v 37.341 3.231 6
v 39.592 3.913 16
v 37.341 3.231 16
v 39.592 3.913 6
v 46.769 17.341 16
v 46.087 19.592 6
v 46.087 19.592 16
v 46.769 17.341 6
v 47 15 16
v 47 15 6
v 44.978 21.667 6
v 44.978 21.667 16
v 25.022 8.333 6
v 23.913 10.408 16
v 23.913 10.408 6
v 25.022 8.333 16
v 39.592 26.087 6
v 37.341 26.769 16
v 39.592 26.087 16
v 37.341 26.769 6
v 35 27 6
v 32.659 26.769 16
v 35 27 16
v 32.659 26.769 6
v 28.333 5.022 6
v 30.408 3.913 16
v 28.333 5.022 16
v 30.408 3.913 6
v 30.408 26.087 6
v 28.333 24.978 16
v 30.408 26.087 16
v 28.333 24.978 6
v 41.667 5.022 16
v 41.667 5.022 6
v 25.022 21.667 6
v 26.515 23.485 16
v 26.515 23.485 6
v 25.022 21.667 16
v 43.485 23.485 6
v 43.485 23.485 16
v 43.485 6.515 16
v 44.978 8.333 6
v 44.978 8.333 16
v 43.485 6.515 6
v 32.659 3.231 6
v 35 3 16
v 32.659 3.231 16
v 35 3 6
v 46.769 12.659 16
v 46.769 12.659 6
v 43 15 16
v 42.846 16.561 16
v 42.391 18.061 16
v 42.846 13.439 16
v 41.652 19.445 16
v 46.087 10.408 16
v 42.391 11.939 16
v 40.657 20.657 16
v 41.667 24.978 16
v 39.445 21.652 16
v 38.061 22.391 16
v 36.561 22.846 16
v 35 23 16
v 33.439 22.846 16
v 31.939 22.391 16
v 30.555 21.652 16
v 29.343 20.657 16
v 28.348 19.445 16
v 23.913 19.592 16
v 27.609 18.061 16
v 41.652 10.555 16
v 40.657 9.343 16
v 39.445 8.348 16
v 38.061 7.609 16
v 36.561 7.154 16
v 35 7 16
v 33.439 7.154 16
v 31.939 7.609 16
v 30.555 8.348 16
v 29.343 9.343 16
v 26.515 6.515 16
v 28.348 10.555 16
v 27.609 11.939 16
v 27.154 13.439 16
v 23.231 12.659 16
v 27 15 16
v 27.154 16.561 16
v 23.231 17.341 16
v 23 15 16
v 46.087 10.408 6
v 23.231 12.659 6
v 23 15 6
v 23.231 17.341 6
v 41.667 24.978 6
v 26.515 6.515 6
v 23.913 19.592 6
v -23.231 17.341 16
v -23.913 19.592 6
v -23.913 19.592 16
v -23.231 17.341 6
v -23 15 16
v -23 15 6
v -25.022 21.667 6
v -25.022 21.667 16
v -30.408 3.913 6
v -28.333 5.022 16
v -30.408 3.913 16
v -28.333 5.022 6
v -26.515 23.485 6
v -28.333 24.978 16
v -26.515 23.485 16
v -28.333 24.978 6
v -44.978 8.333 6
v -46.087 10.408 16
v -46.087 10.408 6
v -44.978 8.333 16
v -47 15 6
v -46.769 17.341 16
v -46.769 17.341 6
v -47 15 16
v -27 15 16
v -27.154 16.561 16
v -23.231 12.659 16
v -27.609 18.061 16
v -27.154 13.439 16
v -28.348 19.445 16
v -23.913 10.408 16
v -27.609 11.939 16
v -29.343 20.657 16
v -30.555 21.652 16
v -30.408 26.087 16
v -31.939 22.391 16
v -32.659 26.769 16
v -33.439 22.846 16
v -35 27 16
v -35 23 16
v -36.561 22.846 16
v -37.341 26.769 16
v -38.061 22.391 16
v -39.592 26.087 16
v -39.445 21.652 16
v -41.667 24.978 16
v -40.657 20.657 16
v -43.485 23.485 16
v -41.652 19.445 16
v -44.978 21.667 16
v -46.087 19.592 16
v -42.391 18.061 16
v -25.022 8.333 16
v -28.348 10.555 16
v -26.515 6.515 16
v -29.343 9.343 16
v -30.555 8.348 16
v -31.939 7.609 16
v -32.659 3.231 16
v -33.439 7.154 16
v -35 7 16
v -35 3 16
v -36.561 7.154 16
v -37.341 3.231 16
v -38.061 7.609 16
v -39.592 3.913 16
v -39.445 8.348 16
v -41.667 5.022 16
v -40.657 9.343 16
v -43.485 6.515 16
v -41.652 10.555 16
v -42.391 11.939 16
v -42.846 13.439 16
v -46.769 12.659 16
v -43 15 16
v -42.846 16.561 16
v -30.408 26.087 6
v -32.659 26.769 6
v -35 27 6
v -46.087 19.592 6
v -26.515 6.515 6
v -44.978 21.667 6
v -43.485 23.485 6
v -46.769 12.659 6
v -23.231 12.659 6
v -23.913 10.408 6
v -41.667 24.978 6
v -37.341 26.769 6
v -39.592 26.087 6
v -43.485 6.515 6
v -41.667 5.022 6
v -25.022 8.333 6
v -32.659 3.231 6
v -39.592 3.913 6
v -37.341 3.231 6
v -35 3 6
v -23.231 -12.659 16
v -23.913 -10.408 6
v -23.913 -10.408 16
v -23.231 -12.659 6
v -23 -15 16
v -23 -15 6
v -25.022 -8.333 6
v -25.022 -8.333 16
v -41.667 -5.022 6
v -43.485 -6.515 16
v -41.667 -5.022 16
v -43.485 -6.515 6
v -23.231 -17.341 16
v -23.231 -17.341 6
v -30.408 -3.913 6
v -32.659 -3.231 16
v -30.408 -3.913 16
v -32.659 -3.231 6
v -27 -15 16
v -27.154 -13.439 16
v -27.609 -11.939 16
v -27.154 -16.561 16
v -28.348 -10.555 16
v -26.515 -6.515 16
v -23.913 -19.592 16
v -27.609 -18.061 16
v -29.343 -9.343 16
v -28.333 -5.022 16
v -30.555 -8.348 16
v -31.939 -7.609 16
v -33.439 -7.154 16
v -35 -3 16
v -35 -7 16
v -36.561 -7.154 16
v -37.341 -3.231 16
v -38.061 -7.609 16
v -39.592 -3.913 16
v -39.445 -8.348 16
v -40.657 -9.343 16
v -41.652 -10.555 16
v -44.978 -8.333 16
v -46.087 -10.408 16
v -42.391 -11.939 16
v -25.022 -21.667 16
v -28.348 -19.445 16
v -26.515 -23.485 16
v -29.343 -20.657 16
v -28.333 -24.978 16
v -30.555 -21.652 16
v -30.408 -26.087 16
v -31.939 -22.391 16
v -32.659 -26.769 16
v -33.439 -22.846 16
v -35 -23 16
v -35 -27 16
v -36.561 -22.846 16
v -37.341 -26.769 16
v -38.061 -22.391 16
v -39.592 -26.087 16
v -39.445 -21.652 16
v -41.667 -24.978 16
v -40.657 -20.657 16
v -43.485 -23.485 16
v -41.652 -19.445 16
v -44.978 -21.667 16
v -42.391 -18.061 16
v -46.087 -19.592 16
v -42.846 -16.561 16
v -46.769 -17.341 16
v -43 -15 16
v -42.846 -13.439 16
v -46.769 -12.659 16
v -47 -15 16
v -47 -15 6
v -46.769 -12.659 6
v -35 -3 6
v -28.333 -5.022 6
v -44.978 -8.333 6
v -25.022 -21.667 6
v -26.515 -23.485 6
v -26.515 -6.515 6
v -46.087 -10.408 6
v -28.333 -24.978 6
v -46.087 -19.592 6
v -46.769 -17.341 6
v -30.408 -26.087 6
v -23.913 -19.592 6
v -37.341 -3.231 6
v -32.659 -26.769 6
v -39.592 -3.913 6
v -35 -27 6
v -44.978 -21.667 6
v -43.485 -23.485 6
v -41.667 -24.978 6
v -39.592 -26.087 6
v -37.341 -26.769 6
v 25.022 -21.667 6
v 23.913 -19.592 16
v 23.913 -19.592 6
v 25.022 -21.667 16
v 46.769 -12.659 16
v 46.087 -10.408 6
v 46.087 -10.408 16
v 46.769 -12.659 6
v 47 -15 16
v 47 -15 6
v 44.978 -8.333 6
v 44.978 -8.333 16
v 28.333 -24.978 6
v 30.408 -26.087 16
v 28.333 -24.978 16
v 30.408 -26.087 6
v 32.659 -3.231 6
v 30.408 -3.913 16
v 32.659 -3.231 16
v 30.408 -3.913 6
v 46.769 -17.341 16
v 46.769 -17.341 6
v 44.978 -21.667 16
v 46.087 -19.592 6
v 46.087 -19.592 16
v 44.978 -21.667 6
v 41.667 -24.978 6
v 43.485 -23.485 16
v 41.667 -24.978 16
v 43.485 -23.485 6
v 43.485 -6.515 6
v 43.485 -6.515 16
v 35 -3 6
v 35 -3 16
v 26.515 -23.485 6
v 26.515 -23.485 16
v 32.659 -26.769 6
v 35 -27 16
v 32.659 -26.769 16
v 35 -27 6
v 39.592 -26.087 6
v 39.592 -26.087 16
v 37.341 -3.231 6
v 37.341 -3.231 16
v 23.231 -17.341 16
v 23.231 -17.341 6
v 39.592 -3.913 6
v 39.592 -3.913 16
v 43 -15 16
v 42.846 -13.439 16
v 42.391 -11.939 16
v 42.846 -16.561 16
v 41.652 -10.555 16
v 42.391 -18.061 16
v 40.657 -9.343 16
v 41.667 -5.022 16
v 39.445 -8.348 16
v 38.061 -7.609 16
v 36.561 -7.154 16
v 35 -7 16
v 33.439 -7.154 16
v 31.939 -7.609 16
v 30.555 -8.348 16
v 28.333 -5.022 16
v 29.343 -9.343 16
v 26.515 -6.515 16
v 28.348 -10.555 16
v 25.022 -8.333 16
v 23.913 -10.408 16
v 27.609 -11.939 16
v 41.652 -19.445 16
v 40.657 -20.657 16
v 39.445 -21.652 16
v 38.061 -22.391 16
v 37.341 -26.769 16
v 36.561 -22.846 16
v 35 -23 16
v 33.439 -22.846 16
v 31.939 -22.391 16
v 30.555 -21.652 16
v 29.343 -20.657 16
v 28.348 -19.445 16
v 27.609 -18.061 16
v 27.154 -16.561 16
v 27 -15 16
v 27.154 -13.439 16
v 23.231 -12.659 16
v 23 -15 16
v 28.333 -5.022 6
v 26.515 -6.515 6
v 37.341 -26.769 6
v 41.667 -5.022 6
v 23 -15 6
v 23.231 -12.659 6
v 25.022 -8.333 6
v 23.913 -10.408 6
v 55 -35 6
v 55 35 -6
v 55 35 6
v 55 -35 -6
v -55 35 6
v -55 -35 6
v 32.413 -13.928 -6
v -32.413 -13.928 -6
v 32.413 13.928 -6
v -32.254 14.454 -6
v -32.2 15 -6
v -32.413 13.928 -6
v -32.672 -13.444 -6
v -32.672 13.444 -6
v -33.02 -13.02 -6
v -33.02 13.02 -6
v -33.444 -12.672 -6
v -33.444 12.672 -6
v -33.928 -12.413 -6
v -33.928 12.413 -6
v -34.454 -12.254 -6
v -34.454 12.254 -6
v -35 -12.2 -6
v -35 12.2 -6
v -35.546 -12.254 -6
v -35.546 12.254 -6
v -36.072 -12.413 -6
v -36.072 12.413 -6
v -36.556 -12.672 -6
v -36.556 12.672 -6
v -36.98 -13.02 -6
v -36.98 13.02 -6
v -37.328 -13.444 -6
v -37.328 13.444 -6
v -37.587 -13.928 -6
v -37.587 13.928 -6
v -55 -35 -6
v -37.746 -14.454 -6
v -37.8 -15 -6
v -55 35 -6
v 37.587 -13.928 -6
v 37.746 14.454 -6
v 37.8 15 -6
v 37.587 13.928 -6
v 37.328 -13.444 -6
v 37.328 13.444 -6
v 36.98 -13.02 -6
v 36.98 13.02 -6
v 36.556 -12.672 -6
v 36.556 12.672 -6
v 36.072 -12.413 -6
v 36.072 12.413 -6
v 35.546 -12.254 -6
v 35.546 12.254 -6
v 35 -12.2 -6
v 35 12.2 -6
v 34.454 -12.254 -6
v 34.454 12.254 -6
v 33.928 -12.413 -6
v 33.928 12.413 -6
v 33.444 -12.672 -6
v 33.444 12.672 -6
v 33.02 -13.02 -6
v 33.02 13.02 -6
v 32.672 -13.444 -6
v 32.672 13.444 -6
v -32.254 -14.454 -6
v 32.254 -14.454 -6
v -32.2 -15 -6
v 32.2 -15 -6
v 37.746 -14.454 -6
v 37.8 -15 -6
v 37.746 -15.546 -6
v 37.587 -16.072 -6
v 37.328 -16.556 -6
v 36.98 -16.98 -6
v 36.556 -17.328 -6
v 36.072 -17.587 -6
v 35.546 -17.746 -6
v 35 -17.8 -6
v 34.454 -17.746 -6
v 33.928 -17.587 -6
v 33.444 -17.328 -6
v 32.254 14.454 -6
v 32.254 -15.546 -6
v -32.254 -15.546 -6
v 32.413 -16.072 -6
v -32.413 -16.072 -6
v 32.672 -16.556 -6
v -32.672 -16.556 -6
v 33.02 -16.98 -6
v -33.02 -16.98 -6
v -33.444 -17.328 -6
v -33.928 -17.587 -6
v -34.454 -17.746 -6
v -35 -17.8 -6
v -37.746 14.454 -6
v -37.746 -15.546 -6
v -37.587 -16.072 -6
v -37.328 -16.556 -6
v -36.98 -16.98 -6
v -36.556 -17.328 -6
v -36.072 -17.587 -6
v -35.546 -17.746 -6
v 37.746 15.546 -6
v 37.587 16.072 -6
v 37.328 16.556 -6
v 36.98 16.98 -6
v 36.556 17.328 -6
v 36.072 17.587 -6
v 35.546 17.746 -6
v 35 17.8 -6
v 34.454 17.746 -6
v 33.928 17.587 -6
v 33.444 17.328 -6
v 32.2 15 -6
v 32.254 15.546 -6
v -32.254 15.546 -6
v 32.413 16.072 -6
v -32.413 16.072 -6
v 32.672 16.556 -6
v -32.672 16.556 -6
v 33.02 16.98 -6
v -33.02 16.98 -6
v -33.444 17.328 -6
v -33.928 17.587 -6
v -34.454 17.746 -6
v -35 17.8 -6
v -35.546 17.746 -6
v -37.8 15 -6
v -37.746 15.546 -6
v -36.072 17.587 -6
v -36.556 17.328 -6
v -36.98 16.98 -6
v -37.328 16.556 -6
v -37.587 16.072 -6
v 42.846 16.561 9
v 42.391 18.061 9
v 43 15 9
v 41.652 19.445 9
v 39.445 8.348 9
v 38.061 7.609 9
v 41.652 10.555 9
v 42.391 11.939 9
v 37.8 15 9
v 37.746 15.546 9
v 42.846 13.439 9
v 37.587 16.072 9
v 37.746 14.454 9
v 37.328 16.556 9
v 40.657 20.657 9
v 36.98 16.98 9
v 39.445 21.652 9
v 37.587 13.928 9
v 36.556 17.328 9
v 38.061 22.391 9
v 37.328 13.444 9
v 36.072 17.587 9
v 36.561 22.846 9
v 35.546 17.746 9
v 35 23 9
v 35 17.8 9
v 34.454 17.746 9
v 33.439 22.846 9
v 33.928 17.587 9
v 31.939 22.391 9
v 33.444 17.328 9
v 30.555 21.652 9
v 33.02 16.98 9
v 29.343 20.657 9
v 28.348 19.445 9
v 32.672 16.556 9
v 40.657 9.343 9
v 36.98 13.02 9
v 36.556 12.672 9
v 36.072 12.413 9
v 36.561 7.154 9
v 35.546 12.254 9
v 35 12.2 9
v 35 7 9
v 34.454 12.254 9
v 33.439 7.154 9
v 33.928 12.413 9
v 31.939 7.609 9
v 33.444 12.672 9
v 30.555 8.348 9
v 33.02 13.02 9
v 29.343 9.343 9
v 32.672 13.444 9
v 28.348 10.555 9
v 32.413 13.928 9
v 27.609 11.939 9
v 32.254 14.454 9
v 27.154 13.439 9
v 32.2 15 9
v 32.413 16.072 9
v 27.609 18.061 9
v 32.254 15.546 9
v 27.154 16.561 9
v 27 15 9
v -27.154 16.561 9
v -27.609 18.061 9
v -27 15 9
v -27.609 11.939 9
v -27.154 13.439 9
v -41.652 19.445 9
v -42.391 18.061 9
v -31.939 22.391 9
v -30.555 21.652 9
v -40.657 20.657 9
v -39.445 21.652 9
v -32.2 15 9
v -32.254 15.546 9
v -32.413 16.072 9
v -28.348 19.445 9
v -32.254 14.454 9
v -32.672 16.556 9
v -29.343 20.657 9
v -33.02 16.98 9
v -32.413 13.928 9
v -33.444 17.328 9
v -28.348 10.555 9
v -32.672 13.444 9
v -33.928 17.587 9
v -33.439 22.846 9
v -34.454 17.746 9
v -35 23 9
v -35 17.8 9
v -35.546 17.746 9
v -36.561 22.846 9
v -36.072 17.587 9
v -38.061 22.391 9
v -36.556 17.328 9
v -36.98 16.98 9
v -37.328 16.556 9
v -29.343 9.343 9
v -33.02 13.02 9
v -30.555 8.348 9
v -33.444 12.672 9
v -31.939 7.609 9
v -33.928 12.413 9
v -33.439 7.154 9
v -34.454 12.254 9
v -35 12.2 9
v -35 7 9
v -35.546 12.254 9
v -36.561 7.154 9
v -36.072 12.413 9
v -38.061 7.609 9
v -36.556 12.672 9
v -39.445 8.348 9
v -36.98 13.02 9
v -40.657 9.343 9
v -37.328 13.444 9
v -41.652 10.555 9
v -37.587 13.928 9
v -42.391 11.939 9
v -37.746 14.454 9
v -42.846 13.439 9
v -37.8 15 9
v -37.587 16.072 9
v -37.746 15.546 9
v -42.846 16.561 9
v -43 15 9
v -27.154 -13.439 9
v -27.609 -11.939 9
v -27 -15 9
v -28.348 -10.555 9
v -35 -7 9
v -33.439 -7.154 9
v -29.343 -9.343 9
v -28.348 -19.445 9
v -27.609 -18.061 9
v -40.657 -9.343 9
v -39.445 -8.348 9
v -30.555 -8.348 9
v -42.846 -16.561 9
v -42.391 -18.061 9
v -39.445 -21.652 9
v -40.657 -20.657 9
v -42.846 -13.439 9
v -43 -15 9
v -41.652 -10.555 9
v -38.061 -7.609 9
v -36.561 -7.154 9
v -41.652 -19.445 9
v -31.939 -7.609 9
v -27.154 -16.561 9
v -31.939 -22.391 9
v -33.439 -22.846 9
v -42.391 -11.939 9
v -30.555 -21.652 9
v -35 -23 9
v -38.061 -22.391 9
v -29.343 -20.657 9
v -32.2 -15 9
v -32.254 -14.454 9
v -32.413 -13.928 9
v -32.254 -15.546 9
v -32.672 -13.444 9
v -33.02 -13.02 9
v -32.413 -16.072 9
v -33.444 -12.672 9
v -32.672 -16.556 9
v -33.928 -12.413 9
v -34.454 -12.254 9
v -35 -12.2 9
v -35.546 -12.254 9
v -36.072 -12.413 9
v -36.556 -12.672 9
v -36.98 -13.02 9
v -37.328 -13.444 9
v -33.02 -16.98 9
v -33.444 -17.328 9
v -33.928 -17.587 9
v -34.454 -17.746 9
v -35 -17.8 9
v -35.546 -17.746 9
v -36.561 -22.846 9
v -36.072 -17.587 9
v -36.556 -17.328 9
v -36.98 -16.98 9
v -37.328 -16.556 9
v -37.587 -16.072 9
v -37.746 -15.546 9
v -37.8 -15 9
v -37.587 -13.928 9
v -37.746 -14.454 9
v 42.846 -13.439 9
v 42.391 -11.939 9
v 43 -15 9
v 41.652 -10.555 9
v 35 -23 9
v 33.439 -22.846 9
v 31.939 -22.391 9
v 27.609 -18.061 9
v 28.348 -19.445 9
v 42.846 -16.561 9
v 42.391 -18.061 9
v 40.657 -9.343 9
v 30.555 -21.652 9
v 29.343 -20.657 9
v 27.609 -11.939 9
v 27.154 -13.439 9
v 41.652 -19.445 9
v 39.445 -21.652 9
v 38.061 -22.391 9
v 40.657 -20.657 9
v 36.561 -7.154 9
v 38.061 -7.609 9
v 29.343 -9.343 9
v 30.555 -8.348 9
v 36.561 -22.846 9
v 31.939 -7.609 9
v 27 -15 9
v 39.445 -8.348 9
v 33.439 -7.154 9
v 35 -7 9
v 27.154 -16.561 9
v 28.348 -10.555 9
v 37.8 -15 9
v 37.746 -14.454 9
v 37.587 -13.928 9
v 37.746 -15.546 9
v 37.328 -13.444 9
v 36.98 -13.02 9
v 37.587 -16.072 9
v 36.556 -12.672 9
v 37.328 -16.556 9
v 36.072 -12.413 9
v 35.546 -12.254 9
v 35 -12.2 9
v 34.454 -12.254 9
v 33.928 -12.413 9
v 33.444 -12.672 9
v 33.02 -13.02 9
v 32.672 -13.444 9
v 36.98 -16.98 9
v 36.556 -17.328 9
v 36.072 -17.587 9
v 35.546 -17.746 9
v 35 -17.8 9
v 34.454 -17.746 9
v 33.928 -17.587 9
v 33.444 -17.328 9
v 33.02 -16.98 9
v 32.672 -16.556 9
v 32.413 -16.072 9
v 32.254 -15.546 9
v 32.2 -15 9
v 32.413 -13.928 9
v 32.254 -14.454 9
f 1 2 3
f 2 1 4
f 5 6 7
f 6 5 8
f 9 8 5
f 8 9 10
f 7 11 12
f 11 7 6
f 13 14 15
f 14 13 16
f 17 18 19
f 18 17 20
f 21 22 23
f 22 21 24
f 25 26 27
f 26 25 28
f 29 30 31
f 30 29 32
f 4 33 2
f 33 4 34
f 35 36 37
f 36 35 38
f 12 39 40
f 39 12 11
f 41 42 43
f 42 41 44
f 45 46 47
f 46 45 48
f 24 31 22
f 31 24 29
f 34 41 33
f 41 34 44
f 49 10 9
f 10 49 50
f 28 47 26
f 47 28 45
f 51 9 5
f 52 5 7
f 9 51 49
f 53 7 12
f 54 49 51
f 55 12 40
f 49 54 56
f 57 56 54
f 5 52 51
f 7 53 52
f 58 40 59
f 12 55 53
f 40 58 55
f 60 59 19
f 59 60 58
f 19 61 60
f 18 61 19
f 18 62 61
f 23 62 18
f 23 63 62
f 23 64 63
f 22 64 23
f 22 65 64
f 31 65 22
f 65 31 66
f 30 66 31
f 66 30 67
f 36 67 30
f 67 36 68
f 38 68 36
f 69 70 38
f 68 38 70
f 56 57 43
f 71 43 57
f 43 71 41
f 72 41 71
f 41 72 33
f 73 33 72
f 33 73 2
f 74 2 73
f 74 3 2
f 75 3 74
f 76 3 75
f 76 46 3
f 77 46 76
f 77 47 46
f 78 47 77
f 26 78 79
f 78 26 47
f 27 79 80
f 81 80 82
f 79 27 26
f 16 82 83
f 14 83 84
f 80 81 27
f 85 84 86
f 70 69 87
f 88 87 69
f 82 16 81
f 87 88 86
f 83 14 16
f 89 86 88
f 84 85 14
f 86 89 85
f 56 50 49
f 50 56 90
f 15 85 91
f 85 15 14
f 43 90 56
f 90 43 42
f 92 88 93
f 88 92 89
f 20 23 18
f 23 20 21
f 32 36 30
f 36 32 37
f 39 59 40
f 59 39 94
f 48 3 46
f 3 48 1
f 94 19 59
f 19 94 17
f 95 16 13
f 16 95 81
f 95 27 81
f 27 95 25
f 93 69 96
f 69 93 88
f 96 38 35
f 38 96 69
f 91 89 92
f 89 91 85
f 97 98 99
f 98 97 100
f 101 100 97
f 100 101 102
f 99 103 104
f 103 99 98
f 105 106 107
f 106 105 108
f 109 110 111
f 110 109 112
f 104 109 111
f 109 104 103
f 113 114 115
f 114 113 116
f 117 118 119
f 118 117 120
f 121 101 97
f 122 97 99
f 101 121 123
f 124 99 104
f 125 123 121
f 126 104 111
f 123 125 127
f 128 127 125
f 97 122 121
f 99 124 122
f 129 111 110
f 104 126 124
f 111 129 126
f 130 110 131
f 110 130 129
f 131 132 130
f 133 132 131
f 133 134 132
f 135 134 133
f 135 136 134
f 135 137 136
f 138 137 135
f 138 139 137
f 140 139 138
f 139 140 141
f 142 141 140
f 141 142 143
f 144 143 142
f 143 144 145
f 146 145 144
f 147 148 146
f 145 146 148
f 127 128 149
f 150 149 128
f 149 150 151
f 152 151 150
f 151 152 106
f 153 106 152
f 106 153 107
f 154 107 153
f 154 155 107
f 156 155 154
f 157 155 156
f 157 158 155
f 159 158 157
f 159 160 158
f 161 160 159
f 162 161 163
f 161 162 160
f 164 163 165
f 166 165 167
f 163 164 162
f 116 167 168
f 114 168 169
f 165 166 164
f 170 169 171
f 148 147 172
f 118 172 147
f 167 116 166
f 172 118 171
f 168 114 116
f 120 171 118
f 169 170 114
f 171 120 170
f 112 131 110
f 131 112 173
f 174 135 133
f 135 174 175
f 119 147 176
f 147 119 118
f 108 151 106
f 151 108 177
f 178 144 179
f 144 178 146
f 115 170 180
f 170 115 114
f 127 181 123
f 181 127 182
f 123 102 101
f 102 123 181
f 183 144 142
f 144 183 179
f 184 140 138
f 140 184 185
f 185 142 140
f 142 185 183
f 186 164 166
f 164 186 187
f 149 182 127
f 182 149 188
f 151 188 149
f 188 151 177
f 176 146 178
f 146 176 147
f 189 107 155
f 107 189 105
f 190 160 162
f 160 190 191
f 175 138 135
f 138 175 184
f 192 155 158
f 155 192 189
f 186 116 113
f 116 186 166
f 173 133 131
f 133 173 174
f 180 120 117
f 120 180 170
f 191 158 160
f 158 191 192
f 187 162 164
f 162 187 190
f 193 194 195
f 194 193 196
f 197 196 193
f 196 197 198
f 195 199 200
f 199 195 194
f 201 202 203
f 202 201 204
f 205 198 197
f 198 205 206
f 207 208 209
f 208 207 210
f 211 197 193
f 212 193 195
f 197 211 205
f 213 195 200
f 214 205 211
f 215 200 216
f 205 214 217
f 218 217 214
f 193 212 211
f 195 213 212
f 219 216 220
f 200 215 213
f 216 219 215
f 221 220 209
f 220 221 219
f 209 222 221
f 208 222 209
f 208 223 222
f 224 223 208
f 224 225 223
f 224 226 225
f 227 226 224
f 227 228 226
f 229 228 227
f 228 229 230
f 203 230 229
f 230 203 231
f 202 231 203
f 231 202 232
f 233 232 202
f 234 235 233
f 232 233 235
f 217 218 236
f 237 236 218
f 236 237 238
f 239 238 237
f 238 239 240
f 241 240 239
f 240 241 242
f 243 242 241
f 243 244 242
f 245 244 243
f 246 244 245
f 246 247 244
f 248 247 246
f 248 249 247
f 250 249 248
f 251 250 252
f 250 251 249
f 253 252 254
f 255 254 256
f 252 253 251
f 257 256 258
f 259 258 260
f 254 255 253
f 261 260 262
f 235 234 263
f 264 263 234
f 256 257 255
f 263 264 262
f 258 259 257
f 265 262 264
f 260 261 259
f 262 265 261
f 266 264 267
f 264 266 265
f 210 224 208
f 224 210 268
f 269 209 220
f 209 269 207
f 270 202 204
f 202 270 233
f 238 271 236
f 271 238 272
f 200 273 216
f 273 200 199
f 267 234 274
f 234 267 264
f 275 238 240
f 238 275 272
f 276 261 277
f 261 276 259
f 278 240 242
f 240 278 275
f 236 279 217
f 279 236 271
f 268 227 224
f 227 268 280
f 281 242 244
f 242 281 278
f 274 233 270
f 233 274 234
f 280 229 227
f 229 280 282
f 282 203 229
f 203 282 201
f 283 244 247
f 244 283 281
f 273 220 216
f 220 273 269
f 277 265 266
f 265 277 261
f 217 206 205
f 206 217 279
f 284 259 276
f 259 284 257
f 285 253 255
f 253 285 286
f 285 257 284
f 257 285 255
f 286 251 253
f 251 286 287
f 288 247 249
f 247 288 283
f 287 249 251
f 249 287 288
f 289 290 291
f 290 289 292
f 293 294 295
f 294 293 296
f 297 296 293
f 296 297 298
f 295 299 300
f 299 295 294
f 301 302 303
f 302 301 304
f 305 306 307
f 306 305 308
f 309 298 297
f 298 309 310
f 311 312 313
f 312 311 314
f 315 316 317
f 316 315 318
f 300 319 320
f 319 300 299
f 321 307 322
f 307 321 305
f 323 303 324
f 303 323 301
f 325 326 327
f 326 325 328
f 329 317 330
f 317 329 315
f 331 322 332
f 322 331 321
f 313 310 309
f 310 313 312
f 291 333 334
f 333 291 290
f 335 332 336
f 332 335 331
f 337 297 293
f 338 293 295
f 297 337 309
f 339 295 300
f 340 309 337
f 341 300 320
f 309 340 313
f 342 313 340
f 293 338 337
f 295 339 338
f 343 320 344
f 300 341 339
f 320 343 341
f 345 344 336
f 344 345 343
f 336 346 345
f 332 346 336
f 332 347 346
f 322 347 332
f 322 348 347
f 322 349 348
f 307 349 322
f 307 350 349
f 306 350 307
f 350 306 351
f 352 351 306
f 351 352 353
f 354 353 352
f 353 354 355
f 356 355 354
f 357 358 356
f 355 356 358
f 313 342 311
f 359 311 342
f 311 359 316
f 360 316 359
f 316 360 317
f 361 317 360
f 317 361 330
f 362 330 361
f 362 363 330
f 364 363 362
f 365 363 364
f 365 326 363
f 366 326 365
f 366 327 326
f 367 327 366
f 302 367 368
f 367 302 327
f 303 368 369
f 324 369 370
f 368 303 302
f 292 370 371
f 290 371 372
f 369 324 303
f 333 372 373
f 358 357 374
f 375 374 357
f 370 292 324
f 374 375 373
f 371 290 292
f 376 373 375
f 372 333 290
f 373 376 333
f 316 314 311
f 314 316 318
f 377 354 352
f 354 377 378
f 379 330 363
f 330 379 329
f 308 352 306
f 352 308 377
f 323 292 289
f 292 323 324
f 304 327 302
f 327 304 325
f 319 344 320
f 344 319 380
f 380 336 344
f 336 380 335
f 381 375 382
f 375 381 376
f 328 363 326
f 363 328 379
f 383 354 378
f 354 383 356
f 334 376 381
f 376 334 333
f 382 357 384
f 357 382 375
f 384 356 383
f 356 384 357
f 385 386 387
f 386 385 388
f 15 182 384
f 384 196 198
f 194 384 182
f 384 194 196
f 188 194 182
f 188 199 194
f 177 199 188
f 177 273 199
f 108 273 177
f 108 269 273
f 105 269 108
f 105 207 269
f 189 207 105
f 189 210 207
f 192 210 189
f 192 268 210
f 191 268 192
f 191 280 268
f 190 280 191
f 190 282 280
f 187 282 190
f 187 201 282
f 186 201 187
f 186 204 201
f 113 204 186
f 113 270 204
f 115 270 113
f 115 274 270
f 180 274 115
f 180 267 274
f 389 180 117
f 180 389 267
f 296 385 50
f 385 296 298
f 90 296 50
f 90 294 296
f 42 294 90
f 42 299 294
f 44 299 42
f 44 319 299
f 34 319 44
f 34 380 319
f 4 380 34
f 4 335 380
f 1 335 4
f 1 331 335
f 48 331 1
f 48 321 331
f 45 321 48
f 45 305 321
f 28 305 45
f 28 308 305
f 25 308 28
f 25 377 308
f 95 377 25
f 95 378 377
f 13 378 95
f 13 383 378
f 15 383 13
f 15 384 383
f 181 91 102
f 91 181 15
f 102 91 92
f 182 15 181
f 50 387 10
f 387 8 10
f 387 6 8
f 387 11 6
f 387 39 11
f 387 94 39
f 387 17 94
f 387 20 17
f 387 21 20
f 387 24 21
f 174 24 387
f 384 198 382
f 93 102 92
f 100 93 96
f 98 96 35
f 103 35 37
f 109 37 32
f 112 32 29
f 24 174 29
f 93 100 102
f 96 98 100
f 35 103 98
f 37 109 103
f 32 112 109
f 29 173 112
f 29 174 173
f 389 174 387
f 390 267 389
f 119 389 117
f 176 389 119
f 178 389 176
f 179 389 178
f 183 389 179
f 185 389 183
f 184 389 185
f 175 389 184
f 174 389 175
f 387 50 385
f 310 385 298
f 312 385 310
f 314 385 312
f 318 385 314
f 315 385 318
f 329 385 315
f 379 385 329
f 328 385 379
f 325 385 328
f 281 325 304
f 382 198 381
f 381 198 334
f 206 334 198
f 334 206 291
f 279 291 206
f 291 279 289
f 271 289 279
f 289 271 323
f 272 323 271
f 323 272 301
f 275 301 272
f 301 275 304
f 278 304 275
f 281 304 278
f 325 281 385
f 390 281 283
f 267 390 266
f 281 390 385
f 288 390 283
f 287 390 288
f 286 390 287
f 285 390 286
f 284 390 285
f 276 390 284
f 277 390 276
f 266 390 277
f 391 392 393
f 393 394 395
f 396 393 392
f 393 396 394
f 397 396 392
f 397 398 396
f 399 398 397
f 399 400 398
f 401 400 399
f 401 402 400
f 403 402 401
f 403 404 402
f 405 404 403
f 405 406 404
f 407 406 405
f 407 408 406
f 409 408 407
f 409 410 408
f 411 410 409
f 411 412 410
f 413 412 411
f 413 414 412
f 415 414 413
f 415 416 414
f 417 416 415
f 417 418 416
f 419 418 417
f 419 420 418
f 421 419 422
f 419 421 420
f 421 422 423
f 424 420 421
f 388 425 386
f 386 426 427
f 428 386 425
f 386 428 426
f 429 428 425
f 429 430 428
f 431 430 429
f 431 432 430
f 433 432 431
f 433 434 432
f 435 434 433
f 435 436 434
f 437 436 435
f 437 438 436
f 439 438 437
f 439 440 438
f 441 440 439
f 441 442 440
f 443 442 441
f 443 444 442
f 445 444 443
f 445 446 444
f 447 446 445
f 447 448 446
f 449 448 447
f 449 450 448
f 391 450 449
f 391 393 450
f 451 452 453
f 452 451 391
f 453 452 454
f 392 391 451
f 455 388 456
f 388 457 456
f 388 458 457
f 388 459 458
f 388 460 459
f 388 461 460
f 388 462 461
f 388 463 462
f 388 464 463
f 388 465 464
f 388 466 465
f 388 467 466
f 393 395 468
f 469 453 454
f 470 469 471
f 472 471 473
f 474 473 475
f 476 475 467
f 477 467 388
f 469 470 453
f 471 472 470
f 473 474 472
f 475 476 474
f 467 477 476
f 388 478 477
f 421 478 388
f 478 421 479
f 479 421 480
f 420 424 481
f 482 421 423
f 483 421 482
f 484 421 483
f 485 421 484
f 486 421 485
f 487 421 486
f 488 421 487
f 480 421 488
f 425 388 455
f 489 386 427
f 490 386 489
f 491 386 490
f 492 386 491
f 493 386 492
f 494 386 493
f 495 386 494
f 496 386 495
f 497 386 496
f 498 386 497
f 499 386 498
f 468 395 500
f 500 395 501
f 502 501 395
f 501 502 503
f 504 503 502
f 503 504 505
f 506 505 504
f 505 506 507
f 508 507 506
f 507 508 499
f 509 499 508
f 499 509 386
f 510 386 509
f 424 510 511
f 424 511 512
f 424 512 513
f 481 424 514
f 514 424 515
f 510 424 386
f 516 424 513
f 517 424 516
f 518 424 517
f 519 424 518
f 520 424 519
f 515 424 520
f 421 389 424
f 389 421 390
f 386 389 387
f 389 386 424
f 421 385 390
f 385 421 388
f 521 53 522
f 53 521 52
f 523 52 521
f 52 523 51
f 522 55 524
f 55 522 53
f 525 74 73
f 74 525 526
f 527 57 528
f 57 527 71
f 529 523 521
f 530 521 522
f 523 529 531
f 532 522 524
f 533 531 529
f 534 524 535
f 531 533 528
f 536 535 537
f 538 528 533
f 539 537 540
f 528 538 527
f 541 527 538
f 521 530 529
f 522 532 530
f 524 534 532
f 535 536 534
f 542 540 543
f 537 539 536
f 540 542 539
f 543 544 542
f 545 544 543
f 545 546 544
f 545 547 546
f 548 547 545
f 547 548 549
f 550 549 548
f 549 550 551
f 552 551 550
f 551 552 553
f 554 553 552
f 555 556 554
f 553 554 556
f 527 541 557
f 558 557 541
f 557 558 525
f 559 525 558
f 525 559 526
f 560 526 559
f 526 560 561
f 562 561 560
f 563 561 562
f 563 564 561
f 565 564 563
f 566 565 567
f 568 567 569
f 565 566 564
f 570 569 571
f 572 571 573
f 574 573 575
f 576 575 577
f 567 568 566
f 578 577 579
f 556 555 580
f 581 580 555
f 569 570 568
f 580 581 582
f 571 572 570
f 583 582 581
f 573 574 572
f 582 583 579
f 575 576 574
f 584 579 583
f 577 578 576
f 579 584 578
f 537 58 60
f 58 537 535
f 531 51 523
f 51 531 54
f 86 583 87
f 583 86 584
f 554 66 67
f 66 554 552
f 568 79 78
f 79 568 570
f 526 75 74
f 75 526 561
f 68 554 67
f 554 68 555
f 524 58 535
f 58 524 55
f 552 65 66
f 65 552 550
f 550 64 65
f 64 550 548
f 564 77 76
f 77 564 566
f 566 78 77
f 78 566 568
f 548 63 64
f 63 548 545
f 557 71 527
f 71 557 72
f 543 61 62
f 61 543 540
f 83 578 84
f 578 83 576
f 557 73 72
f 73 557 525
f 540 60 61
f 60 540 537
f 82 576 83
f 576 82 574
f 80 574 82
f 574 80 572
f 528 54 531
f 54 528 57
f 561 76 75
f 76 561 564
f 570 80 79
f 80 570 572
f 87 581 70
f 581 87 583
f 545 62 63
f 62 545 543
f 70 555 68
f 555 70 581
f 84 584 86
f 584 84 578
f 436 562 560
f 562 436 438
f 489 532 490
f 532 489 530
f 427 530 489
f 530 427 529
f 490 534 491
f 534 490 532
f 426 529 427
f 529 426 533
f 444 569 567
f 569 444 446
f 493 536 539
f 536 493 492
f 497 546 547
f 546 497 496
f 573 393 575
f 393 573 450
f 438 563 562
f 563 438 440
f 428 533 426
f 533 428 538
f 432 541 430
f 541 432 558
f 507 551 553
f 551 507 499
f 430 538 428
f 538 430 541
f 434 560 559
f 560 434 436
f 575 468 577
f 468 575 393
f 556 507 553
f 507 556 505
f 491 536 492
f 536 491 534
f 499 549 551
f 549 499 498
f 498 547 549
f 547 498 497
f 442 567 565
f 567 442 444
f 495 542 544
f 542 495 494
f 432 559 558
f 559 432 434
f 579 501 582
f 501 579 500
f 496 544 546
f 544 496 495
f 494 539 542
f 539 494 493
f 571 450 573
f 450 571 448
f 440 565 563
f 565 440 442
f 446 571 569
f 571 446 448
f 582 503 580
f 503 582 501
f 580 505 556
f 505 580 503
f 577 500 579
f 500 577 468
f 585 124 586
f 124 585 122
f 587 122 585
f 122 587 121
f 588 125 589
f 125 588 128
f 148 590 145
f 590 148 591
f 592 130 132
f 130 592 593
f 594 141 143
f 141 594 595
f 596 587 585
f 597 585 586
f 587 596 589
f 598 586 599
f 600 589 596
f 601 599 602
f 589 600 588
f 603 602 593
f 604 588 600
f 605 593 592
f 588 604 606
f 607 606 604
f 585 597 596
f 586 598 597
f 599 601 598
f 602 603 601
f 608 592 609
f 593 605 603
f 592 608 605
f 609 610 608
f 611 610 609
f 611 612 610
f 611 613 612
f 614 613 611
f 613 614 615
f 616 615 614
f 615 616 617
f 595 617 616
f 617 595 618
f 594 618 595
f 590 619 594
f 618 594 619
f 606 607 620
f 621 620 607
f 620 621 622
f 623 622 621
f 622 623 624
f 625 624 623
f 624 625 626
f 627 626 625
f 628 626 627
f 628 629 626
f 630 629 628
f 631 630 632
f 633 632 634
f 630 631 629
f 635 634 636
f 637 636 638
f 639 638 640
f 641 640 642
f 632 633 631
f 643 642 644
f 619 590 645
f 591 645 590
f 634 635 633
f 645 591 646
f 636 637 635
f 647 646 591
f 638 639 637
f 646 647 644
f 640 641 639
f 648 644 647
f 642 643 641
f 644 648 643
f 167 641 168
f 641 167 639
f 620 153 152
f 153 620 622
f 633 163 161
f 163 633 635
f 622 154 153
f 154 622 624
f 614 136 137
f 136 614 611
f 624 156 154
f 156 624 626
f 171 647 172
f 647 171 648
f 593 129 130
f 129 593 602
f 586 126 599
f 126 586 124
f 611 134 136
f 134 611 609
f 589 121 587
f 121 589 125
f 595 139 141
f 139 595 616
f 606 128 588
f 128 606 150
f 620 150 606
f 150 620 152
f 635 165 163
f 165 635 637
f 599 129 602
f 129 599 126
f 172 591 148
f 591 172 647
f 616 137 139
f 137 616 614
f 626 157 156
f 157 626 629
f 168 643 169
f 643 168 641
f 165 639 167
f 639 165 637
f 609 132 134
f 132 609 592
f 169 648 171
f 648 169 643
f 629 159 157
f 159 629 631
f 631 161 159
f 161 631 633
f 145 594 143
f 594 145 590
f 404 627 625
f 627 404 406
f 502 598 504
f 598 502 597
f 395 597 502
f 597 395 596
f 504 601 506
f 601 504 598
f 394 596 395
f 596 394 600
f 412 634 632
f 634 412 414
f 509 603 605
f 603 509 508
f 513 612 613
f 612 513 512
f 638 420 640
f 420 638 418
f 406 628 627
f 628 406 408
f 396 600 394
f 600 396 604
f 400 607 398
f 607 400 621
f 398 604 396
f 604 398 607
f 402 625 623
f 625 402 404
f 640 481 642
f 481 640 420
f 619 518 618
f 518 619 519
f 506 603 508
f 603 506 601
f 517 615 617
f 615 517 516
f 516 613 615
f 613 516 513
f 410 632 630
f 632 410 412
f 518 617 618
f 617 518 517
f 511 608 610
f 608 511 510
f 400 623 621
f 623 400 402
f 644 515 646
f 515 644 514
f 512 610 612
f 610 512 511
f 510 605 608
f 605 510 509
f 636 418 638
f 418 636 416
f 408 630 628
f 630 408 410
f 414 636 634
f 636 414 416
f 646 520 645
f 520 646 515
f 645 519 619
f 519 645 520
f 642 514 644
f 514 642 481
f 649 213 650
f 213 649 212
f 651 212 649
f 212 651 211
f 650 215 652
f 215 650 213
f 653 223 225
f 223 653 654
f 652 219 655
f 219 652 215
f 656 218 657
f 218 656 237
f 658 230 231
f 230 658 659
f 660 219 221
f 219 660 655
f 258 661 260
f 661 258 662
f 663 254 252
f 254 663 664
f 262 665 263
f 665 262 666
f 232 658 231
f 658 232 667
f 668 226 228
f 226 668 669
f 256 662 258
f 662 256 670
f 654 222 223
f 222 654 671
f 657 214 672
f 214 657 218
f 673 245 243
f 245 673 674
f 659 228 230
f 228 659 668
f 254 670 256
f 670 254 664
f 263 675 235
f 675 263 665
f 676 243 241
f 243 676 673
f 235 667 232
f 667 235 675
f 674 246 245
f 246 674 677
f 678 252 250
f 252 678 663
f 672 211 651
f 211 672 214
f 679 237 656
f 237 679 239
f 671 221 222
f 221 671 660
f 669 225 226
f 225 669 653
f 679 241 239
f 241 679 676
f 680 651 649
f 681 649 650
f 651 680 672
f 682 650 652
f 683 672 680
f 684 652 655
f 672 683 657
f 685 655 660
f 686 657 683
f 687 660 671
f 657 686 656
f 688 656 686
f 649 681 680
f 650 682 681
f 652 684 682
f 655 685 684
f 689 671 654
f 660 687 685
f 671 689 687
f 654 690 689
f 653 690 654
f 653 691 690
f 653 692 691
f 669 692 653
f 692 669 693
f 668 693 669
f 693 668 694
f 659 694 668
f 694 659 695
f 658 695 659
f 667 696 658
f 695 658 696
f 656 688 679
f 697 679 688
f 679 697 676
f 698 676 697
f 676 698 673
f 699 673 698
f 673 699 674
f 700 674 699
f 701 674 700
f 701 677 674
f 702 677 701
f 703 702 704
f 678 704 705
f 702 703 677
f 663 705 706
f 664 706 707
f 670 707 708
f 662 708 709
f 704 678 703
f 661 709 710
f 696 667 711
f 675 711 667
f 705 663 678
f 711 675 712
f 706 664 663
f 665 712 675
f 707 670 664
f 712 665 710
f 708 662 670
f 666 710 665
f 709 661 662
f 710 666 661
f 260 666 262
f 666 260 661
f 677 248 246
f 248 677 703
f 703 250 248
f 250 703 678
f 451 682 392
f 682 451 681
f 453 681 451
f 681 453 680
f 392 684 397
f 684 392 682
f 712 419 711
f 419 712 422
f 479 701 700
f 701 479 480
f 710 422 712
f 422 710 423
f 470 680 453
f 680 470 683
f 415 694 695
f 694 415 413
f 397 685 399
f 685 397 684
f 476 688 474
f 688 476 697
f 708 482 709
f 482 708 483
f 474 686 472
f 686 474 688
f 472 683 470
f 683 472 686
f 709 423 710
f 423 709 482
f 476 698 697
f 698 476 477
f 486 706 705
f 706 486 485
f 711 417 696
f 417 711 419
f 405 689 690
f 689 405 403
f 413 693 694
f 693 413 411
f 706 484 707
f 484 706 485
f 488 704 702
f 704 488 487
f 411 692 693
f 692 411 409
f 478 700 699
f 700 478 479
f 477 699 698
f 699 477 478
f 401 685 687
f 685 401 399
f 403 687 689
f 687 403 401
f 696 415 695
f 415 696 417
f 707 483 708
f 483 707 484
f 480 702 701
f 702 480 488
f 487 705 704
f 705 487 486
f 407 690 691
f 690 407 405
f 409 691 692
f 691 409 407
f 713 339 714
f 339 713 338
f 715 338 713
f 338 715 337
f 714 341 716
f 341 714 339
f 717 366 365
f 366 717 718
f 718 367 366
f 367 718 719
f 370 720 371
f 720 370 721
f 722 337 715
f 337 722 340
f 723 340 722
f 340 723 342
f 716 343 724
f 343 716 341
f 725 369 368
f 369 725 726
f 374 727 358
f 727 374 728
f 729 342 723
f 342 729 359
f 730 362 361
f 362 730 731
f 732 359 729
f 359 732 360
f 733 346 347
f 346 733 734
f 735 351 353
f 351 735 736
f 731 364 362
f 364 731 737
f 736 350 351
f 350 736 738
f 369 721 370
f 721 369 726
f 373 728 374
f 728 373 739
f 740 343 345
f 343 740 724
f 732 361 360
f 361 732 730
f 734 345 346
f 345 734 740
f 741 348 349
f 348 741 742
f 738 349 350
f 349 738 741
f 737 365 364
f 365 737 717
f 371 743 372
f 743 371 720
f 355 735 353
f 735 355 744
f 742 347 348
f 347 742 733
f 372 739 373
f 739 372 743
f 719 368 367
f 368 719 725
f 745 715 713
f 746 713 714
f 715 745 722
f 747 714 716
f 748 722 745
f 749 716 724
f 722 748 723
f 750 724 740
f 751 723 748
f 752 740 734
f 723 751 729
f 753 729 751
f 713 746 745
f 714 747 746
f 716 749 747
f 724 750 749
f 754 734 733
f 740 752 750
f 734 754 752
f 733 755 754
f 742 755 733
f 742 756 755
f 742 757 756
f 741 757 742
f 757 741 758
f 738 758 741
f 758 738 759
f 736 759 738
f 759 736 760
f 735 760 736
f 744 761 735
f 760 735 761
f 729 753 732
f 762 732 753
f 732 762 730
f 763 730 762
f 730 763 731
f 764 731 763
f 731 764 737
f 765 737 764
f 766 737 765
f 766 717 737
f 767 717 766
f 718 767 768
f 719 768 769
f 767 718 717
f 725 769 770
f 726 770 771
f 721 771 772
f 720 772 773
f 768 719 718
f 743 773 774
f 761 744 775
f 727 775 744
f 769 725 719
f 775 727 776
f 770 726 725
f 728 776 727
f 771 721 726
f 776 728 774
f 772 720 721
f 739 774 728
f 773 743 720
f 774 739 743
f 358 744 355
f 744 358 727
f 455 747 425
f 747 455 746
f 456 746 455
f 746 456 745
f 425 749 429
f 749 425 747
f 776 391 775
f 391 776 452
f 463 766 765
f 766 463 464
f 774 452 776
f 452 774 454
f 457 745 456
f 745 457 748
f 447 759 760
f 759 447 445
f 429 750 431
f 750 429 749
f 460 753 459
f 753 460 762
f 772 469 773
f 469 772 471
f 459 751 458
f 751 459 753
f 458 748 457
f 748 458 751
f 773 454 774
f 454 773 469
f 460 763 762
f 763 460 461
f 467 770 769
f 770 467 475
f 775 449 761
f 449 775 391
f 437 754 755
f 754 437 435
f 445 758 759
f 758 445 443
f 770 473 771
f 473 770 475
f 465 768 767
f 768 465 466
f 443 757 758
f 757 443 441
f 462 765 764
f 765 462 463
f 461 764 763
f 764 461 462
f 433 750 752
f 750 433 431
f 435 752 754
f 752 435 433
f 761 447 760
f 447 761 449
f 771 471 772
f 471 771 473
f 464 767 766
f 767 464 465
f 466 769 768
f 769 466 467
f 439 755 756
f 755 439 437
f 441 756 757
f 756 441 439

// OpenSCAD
$fn = 32;

// ----------------------------------------------------------------------
// Socket pad plate
// bosses with counterbored sockets for the screws
// ----------------------------------------------------------------------

// --- parameters (mm) ---
base_t = 12;            // base plate thickness
boss_h = 10;            // boss height above the base plate
boss_d = 24;            // boss diameter
socket_d = 16;          // socket diameter
socket_depth = 7;       // socket depth from the boss face
bolt_d = 5.6;           // screw clearance hole through the socket floor
plate = [110, 70, 12];  // overall size (x, y, z)
edge = 20;              // boss centre offset from the plate edge
pads = 4;               // boss count, one per corner

// --- derived feature positions (mm) ---
height = base_t + boss_h;        // = 22   overall height of the part
corner_x = plate[0] / 2 - edge;  // = 35   boss centre X
corner_y = plate[1] / 2 - edge;  // = 15   boss centre Y
feature_centers = [
  [corner_x, corner_y],
  [-corner_x, corner_y],
  [-corner_x, -corner_y],
  [corner_x, -corner_y]
];   // boss centres: sockets, holes and the pads themselves are placed from here

// base plate, bosses on feature_centers, socket + through hole in each
difference() {
  union() {
    cube(plate, center = true);
    for (centre = feature_centers)
      translate([centre[0], centre[1], plate[2] / 2 - 1])
        cylinder(d = boss_d, h = boss_h + 1);
  }
  for (centre = feature_centers) {
    translate([centre[0], centre[1], plate[2] / 2 + boss_h - socket_depth])
      cylinder(d = socket_d, h = socket_depth + 1);
    translate([centre[0], centre[1], -height])
      cylinder(d = bolt_d, h = 2 * height + 2);  // through the socket floor
  }
}
